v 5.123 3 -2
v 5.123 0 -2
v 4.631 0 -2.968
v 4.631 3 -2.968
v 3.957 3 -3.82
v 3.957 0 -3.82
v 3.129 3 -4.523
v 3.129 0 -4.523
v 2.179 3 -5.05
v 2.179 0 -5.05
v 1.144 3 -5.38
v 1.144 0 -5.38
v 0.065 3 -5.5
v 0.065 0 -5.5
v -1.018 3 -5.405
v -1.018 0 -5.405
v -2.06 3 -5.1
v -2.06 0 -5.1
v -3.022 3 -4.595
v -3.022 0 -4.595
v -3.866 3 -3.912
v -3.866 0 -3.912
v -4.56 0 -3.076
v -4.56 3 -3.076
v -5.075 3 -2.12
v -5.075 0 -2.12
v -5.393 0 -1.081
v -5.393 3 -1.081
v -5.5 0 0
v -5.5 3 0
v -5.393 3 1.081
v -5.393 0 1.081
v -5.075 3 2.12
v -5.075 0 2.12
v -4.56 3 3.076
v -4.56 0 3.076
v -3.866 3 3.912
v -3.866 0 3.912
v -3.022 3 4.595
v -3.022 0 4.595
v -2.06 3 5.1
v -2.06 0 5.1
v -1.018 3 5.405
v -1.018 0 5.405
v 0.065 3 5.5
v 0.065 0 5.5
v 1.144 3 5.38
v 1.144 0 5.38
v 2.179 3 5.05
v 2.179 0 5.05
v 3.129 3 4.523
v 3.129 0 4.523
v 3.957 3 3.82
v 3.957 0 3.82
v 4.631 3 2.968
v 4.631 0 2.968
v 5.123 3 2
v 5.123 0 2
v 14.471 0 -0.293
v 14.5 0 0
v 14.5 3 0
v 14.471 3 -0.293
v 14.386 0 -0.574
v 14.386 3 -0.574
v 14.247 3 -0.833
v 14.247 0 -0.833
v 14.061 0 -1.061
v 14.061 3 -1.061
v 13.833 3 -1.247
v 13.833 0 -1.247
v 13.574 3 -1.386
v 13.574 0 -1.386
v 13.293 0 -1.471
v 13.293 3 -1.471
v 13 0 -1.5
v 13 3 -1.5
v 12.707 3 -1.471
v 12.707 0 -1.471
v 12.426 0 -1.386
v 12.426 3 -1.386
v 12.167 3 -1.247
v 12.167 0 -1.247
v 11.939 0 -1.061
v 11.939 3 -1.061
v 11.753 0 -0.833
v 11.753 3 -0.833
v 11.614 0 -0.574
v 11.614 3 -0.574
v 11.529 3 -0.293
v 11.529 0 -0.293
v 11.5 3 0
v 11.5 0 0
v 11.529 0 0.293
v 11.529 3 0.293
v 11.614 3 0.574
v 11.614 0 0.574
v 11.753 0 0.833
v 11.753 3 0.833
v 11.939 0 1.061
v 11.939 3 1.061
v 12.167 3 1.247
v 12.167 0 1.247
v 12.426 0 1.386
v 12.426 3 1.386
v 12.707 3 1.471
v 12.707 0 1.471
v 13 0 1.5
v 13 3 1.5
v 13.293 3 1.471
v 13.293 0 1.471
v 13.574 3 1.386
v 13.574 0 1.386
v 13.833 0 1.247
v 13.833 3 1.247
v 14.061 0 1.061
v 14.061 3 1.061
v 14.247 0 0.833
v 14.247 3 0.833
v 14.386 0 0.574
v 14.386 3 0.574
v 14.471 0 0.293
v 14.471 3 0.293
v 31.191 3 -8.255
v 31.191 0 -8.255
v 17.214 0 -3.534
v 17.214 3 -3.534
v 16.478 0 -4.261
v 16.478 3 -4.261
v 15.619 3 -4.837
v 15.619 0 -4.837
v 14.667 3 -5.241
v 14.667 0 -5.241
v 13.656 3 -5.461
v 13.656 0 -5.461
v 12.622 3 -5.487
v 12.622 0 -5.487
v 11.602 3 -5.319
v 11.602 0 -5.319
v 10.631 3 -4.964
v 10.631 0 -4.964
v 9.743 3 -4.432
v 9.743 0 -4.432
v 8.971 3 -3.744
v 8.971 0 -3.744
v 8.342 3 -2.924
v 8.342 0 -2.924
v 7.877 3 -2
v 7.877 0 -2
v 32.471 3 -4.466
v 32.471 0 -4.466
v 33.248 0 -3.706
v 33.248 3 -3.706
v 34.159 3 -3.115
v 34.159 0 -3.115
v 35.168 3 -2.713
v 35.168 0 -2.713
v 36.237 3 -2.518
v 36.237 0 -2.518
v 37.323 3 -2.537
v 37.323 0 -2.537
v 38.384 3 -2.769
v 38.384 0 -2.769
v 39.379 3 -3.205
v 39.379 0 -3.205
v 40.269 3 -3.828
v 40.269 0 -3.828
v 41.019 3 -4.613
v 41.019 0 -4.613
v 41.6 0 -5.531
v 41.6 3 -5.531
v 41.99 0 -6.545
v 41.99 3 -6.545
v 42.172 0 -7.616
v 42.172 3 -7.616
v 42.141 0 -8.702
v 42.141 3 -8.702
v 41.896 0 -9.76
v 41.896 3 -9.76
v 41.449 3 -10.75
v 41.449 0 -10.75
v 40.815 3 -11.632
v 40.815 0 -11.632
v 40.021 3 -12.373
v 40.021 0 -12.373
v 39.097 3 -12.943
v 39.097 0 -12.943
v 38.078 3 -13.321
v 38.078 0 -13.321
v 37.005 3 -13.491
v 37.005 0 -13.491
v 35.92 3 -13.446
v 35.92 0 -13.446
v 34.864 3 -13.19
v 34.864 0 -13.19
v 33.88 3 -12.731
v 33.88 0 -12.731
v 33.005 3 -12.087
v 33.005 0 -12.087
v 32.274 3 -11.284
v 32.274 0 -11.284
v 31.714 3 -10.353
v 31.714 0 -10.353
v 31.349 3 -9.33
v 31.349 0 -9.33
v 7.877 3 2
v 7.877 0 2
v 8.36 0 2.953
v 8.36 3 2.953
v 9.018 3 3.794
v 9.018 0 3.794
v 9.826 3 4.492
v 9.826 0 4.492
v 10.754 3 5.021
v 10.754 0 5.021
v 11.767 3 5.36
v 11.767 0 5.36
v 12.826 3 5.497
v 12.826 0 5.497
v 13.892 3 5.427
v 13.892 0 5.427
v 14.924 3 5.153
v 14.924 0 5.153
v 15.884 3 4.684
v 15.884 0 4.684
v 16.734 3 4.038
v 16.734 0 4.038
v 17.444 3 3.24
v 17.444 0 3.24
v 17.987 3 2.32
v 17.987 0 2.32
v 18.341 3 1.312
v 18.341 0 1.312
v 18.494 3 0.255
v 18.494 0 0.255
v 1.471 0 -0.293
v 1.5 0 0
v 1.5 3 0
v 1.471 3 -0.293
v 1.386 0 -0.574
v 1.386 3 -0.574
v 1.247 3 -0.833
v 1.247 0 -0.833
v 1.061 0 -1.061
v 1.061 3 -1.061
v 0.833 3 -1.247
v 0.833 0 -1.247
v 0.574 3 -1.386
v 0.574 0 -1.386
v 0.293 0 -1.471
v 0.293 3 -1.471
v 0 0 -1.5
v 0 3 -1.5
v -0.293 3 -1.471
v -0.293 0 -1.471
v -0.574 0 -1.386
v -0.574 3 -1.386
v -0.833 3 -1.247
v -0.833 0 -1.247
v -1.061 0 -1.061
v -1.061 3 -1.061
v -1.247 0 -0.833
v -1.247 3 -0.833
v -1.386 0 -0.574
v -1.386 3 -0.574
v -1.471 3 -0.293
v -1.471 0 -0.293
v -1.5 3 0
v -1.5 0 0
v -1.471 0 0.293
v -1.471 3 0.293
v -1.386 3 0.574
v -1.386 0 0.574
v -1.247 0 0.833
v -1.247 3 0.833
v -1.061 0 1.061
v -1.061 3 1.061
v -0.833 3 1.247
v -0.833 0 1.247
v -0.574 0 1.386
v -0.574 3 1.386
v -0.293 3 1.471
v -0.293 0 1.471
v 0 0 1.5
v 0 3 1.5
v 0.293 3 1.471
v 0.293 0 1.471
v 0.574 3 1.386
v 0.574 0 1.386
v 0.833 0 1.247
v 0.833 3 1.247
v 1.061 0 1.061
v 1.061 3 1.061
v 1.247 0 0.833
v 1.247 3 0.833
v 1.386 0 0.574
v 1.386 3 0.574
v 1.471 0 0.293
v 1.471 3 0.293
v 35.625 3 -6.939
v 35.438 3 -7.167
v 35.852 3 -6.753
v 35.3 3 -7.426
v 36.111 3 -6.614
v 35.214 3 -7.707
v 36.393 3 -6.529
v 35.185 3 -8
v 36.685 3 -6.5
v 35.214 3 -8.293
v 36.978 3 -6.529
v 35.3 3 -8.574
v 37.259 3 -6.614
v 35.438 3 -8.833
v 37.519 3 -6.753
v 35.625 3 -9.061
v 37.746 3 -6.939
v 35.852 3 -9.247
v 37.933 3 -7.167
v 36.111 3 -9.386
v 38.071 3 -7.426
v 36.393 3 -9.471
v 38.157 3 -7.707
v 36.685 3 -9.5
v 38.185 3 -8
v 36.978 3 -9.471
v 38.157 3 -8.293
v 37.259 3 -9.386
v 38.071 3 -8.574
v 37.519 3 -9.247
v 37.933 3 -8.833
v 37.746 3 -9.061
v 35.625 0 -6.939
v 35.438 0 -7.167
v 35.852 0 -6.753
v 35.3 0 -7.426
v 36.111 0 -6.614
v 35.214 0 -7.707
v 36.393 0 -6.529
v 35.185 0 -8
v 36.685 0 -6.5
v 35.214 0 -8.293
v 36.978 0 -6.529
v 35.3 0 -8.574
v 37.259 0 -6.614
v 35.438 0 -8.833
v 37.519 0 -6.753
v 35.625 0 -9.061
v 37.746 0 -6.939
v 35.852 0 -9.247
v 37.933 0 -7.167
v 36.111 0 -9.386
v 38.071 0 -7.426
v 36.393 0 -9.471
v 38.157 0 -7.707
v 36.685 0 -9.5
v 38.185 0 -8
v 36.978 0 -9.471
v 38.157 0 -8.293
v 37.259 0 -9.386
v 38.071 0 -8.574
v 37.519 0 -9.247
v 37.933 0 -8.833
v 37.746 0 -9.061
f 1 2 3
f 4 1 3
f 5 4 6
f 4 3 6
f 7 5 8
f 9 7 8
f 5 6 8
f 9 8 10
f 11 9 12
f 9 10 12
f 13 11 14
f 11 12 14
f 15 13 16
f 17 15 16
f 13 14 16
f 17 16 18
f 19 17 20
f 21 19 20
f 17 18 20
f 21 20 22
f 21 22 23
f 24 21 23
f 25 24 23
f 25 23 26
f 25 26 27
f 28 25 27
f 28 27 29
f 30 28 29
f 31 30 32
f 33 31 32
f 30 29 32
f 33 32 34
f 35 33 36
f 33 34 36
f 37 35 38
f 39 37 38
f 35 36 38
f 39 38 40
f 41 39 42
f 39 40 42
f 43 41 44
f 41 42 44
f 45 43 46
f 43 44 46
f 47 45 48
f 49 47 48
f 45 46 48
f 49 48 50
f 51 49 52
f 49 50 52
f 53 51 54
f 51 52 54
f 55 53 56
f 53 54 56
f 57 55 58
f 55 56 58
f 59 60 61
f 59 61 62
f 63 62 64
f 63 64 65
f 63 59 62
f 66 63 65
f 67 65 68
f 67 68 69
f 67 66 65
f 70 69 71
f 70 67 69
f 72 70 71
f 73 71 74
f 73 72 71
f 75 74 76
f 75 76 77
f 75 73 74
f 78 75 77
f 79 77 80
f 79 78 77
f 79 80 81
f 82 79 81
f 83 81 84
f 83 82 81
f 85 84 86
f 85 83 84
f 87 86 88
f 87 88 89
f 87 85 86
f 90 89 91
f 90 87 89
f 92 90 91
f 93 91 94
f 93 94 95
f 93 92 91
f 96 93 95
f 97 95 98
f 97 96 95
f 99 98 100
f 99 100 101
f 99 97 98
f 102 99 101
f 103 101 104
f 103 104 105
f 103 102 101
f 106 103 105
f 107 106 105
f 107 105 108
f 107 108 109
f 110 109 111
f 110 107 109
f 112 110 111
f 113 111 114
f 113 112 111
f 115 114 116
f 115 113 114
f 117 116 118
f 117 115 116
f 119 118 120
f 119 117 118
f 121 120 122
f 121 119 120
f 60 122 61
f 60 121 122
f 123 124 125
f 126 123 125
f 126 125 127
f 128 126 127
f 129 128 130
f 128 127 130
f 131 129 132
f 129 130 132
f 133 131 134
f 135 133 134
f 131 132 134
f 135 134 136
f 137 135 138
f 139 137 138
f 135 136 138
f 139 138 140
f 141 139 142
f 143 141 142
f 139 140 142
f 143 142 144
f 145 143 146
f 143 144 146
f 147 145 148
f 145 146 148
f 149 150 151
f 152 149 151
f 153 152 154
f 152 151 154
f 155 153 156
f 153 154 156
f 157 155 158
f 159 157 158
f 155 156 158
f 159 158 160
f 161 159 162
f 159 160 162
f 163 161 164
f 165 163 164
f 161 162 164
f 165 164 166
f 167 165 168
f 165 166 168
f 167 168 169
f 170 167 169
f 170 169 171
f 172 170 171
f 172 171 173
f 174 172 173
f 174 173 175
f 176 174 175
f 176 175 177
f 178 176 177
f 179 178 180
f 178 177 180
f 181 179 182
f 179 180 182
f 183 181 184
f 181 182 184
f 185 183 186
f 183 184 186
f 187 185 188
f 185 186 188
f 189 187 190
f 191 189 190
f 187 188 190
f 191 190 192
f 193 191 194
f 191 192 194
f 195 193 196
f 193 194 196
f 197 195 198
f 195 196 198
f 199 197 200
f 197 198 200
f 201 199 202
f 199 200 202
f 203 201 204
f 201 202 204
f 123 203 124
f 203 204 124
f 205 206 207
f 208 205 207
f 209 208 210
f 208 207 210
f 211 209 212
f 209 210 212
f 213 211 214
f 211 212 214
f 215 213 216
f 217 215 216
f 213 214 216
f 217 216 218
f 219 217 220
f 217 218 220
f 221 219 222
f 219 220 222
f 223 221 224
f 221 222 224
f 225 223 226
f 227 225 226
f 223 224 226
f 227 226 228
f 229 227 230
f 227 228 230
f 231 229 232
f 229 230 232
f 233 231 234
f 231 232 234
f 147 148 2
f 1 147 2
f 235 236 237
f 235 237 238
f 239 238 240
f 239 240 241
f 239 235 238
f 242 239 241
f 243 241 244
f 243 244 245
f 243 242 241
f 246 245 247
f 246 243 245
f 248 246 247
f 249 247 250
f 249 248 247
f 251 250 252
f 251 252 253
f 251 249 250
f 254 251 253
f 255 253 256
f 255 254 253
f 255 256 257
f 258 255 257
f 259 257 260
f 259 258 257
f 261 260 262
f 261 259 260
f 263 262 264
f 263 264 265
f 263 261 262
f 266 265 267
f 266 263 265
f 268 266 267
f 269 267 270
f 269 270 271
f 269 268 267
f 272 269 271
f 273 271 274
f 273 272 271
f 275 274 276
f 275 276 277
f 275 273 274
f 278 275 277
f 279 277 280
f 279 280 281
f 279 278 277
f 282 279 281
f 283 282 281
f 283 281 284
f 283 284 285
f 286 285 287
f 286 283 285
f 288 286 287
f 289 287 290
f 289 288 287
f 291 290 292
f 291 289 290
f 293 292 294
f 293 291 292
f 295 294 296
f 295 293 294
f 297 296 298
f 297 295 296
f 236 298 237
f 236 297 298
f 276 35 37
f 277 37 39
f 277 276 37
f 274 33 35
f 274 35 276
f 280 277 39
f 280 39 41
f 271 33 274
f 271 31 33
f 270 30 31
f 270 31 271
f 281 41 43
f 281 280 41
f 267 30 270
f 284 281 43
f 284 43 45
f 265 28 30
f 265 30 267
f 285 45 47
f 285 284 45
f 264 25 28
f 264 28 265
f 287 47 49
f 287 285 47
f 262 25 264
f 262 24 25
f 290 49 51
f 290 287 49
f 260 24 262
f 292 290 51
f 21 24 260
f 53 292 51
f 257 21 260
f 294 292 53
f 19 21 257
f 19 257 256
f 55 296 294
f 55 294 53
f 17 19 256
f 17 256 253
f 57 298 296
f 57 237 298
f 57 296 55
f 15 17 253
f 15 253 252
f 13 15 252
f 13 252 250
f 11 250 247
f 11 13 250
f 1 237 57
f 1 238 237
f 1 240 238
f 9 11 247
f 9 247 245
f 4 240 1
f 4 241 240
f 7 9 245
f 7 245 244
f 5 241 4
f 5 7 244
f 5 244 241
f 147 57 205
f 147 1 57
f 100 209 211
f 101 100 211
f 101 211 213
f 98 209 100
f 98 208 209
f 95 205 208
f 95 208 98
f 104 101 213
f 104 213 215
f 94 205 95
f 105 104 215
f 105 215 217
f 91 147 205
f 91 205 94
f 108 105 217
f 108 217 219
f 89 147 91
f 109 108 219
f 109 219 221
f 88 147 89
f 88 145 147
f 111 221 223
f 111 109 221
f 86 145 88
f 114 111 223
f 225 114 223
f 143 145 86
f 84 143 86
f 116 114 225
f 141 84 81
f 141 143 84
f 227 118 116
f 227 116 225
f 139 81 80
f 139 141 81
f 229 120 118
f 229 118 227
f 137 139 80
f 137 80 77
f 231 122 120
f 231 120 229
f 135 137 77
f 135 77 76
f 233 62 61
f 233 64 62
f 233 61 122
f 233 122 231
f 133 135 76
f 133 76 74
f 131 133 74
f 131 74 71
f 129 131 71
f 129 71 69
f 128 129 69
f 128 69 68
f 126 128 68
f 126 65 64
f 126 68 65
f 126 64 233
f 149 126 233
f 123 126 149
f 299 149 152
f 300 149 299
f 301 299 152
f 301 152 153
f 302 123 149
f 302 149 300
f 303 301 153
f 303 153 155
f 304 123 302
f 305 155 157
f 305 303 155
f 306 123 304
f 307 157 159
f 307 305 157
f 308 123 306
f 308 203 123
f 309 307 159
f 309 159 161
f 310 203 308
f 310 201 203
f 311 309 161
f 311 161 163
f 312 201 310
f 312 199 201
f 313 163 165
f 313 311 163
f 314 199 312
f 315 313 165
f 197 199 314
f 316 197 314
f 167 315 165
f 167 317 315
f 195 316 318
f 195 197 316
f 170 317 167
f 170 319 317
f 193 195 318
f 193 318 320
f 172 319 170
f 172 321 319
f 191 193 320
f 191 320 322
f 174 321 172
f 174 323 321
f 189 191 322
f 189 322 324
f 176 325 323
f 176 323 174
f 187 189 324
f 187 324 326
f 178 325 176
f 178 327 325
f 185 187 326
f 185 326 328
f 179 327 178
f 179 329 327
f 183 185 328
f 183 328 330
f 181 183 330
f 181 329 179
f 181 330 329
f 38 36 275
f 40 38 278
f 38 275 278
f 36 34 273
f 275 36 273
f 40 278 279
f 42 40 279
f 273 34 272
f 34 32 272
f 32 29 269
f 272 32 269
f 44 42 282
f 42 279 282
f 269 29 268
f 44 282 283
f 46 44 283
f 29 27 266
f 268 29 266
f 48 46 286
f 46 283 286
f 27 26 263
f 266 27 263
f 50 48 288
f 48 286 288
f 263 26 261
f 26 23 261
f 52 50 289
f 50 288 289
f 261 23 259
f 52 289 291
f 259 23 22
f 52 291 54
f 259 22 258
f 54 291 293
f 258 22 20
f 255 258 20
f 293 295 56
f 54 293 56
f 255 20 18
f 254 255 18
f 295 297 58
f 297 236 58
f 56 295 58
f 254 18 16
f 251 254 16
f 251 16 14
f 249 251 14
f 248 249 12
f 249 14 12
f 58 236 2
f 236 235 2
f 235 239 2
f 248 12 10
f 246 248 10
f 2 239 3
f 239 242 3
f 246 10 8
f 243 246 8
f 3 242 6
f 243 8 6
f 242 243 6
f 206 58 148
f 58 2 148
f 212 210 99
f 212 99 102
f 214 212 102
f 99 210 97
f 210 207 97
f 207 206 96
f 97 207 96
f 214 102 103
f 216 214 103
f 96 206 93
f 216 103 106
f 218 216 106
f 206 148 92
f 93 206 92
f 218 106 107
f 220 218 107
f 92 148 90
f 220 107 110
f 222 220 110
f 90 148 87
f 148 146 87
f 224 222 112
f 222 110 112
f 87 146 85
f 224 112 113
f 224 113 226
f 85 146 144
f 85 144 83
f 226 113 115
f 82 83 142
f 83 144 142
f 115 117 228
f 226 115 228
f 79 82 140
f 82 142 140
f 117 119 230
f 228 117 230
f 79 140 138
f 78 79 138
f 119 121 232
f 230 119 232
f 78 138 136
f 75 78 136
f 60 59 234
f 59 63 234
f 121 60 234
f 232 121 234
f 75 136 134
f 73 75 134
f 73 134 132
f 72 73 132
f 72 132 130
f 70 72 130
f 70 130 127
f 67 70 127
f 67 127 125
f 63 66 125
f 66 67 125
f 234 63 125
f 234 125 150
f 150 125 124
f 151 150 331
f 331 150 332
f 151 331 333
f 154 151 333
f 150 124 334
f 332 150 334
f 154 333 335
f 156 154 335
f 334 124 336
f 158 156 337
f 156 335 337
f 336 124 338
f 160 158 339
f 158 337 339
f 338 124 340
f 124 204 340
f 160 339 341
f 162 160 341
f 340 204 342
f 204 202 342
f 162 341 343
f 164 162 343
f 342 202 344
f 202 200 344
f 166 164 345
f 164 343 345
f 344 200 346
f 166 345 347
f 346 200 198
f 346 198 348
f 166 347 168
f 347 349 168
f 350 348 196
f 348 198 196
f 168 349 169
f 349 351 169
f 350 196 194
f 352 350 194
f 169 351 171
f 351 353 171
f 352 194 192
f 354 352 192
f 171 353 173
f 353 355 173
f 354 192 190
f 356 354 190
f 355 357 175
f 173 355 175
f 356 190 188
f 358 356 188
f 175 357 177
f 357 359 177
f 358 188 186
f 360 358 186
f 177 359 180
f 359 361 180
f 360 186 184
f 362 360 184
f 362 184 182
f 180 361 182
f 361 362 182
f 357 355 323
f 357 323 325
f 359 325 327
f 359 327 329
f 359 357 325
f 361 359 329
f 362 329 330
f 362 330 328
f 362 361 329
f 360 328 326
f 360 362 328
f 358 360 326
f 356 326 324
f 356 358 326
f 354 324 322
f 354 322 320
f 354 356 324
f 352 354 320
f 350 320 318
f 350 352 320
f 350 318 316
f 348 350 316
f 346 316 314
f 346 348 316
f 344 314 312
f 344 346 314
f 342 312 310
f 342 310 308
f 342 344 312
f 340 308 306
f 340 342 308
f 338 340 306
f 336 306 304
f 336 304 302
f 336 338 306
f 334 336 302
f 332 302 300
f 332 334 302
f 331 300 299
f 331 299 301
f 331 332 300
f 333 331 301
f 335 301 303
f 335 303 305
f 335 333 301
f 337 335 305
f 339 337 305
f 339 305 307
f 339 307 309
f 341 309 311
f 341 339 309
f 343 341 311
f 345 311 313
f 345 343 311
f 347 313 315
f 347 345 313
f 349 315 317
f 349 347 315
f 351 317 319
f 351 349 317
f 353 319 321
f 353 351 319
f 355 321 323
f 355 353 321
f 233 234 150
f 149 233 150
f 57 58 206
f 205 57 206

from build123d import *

# Parameters (mm, degrees)
SKETCH1_R           = 1.5
BOSS_EXTRUDE1_DEPTH = 3


with BuildPart() as part:
    # Sketch1 → Boss-Extrude1 (new body)
    with BuildSketch(Plane(origin=(0, 0, 0), x_dir=(1, 0, 0), z_dir=(0, 1, 0))):
        with BuildLine():
            ThreePointArc((5.123475383, 2), (-5.5, 0), (5.123475383, -2))
            Line((5.123475383, -2), (7.876524617, -2))
            ThreePointArc((7.876524617, -2), (13.891801362, -5.42721755), (18.494070457, -0.255322963))
            Line((18.494070457, -0.255322963), (32.471368108, 4.465652792))
            ThreePointArc((32.471368108, 4.465652792), (41.896235049, 9.76), (31.191368108, 8.255322963))
            Line((31.191368108, 8.255322963), (17.214070457, 3.534347208))
            ThreePointArc((17.214070457, 3.534347208), (12.108198638, 5.42721755), (7.876524617, 2))
            Line((7.876524617, 2), (5.123475383, 2))
        make_face()
        Circle(SKETCH1_R, mode=Mode.SUBTRACT)
        with Locations((13, 0)):
            Circle(SKETCH1_R, mode=Mode.SUBTRACT)
        with Locations((36.685438565, 8)):
            Circle(SKETCH1_R, mode=Mode.SUBTRACT)
    extrude(amount=BOSS_EXTRUDE1_DEPTH)


solid = part.part
